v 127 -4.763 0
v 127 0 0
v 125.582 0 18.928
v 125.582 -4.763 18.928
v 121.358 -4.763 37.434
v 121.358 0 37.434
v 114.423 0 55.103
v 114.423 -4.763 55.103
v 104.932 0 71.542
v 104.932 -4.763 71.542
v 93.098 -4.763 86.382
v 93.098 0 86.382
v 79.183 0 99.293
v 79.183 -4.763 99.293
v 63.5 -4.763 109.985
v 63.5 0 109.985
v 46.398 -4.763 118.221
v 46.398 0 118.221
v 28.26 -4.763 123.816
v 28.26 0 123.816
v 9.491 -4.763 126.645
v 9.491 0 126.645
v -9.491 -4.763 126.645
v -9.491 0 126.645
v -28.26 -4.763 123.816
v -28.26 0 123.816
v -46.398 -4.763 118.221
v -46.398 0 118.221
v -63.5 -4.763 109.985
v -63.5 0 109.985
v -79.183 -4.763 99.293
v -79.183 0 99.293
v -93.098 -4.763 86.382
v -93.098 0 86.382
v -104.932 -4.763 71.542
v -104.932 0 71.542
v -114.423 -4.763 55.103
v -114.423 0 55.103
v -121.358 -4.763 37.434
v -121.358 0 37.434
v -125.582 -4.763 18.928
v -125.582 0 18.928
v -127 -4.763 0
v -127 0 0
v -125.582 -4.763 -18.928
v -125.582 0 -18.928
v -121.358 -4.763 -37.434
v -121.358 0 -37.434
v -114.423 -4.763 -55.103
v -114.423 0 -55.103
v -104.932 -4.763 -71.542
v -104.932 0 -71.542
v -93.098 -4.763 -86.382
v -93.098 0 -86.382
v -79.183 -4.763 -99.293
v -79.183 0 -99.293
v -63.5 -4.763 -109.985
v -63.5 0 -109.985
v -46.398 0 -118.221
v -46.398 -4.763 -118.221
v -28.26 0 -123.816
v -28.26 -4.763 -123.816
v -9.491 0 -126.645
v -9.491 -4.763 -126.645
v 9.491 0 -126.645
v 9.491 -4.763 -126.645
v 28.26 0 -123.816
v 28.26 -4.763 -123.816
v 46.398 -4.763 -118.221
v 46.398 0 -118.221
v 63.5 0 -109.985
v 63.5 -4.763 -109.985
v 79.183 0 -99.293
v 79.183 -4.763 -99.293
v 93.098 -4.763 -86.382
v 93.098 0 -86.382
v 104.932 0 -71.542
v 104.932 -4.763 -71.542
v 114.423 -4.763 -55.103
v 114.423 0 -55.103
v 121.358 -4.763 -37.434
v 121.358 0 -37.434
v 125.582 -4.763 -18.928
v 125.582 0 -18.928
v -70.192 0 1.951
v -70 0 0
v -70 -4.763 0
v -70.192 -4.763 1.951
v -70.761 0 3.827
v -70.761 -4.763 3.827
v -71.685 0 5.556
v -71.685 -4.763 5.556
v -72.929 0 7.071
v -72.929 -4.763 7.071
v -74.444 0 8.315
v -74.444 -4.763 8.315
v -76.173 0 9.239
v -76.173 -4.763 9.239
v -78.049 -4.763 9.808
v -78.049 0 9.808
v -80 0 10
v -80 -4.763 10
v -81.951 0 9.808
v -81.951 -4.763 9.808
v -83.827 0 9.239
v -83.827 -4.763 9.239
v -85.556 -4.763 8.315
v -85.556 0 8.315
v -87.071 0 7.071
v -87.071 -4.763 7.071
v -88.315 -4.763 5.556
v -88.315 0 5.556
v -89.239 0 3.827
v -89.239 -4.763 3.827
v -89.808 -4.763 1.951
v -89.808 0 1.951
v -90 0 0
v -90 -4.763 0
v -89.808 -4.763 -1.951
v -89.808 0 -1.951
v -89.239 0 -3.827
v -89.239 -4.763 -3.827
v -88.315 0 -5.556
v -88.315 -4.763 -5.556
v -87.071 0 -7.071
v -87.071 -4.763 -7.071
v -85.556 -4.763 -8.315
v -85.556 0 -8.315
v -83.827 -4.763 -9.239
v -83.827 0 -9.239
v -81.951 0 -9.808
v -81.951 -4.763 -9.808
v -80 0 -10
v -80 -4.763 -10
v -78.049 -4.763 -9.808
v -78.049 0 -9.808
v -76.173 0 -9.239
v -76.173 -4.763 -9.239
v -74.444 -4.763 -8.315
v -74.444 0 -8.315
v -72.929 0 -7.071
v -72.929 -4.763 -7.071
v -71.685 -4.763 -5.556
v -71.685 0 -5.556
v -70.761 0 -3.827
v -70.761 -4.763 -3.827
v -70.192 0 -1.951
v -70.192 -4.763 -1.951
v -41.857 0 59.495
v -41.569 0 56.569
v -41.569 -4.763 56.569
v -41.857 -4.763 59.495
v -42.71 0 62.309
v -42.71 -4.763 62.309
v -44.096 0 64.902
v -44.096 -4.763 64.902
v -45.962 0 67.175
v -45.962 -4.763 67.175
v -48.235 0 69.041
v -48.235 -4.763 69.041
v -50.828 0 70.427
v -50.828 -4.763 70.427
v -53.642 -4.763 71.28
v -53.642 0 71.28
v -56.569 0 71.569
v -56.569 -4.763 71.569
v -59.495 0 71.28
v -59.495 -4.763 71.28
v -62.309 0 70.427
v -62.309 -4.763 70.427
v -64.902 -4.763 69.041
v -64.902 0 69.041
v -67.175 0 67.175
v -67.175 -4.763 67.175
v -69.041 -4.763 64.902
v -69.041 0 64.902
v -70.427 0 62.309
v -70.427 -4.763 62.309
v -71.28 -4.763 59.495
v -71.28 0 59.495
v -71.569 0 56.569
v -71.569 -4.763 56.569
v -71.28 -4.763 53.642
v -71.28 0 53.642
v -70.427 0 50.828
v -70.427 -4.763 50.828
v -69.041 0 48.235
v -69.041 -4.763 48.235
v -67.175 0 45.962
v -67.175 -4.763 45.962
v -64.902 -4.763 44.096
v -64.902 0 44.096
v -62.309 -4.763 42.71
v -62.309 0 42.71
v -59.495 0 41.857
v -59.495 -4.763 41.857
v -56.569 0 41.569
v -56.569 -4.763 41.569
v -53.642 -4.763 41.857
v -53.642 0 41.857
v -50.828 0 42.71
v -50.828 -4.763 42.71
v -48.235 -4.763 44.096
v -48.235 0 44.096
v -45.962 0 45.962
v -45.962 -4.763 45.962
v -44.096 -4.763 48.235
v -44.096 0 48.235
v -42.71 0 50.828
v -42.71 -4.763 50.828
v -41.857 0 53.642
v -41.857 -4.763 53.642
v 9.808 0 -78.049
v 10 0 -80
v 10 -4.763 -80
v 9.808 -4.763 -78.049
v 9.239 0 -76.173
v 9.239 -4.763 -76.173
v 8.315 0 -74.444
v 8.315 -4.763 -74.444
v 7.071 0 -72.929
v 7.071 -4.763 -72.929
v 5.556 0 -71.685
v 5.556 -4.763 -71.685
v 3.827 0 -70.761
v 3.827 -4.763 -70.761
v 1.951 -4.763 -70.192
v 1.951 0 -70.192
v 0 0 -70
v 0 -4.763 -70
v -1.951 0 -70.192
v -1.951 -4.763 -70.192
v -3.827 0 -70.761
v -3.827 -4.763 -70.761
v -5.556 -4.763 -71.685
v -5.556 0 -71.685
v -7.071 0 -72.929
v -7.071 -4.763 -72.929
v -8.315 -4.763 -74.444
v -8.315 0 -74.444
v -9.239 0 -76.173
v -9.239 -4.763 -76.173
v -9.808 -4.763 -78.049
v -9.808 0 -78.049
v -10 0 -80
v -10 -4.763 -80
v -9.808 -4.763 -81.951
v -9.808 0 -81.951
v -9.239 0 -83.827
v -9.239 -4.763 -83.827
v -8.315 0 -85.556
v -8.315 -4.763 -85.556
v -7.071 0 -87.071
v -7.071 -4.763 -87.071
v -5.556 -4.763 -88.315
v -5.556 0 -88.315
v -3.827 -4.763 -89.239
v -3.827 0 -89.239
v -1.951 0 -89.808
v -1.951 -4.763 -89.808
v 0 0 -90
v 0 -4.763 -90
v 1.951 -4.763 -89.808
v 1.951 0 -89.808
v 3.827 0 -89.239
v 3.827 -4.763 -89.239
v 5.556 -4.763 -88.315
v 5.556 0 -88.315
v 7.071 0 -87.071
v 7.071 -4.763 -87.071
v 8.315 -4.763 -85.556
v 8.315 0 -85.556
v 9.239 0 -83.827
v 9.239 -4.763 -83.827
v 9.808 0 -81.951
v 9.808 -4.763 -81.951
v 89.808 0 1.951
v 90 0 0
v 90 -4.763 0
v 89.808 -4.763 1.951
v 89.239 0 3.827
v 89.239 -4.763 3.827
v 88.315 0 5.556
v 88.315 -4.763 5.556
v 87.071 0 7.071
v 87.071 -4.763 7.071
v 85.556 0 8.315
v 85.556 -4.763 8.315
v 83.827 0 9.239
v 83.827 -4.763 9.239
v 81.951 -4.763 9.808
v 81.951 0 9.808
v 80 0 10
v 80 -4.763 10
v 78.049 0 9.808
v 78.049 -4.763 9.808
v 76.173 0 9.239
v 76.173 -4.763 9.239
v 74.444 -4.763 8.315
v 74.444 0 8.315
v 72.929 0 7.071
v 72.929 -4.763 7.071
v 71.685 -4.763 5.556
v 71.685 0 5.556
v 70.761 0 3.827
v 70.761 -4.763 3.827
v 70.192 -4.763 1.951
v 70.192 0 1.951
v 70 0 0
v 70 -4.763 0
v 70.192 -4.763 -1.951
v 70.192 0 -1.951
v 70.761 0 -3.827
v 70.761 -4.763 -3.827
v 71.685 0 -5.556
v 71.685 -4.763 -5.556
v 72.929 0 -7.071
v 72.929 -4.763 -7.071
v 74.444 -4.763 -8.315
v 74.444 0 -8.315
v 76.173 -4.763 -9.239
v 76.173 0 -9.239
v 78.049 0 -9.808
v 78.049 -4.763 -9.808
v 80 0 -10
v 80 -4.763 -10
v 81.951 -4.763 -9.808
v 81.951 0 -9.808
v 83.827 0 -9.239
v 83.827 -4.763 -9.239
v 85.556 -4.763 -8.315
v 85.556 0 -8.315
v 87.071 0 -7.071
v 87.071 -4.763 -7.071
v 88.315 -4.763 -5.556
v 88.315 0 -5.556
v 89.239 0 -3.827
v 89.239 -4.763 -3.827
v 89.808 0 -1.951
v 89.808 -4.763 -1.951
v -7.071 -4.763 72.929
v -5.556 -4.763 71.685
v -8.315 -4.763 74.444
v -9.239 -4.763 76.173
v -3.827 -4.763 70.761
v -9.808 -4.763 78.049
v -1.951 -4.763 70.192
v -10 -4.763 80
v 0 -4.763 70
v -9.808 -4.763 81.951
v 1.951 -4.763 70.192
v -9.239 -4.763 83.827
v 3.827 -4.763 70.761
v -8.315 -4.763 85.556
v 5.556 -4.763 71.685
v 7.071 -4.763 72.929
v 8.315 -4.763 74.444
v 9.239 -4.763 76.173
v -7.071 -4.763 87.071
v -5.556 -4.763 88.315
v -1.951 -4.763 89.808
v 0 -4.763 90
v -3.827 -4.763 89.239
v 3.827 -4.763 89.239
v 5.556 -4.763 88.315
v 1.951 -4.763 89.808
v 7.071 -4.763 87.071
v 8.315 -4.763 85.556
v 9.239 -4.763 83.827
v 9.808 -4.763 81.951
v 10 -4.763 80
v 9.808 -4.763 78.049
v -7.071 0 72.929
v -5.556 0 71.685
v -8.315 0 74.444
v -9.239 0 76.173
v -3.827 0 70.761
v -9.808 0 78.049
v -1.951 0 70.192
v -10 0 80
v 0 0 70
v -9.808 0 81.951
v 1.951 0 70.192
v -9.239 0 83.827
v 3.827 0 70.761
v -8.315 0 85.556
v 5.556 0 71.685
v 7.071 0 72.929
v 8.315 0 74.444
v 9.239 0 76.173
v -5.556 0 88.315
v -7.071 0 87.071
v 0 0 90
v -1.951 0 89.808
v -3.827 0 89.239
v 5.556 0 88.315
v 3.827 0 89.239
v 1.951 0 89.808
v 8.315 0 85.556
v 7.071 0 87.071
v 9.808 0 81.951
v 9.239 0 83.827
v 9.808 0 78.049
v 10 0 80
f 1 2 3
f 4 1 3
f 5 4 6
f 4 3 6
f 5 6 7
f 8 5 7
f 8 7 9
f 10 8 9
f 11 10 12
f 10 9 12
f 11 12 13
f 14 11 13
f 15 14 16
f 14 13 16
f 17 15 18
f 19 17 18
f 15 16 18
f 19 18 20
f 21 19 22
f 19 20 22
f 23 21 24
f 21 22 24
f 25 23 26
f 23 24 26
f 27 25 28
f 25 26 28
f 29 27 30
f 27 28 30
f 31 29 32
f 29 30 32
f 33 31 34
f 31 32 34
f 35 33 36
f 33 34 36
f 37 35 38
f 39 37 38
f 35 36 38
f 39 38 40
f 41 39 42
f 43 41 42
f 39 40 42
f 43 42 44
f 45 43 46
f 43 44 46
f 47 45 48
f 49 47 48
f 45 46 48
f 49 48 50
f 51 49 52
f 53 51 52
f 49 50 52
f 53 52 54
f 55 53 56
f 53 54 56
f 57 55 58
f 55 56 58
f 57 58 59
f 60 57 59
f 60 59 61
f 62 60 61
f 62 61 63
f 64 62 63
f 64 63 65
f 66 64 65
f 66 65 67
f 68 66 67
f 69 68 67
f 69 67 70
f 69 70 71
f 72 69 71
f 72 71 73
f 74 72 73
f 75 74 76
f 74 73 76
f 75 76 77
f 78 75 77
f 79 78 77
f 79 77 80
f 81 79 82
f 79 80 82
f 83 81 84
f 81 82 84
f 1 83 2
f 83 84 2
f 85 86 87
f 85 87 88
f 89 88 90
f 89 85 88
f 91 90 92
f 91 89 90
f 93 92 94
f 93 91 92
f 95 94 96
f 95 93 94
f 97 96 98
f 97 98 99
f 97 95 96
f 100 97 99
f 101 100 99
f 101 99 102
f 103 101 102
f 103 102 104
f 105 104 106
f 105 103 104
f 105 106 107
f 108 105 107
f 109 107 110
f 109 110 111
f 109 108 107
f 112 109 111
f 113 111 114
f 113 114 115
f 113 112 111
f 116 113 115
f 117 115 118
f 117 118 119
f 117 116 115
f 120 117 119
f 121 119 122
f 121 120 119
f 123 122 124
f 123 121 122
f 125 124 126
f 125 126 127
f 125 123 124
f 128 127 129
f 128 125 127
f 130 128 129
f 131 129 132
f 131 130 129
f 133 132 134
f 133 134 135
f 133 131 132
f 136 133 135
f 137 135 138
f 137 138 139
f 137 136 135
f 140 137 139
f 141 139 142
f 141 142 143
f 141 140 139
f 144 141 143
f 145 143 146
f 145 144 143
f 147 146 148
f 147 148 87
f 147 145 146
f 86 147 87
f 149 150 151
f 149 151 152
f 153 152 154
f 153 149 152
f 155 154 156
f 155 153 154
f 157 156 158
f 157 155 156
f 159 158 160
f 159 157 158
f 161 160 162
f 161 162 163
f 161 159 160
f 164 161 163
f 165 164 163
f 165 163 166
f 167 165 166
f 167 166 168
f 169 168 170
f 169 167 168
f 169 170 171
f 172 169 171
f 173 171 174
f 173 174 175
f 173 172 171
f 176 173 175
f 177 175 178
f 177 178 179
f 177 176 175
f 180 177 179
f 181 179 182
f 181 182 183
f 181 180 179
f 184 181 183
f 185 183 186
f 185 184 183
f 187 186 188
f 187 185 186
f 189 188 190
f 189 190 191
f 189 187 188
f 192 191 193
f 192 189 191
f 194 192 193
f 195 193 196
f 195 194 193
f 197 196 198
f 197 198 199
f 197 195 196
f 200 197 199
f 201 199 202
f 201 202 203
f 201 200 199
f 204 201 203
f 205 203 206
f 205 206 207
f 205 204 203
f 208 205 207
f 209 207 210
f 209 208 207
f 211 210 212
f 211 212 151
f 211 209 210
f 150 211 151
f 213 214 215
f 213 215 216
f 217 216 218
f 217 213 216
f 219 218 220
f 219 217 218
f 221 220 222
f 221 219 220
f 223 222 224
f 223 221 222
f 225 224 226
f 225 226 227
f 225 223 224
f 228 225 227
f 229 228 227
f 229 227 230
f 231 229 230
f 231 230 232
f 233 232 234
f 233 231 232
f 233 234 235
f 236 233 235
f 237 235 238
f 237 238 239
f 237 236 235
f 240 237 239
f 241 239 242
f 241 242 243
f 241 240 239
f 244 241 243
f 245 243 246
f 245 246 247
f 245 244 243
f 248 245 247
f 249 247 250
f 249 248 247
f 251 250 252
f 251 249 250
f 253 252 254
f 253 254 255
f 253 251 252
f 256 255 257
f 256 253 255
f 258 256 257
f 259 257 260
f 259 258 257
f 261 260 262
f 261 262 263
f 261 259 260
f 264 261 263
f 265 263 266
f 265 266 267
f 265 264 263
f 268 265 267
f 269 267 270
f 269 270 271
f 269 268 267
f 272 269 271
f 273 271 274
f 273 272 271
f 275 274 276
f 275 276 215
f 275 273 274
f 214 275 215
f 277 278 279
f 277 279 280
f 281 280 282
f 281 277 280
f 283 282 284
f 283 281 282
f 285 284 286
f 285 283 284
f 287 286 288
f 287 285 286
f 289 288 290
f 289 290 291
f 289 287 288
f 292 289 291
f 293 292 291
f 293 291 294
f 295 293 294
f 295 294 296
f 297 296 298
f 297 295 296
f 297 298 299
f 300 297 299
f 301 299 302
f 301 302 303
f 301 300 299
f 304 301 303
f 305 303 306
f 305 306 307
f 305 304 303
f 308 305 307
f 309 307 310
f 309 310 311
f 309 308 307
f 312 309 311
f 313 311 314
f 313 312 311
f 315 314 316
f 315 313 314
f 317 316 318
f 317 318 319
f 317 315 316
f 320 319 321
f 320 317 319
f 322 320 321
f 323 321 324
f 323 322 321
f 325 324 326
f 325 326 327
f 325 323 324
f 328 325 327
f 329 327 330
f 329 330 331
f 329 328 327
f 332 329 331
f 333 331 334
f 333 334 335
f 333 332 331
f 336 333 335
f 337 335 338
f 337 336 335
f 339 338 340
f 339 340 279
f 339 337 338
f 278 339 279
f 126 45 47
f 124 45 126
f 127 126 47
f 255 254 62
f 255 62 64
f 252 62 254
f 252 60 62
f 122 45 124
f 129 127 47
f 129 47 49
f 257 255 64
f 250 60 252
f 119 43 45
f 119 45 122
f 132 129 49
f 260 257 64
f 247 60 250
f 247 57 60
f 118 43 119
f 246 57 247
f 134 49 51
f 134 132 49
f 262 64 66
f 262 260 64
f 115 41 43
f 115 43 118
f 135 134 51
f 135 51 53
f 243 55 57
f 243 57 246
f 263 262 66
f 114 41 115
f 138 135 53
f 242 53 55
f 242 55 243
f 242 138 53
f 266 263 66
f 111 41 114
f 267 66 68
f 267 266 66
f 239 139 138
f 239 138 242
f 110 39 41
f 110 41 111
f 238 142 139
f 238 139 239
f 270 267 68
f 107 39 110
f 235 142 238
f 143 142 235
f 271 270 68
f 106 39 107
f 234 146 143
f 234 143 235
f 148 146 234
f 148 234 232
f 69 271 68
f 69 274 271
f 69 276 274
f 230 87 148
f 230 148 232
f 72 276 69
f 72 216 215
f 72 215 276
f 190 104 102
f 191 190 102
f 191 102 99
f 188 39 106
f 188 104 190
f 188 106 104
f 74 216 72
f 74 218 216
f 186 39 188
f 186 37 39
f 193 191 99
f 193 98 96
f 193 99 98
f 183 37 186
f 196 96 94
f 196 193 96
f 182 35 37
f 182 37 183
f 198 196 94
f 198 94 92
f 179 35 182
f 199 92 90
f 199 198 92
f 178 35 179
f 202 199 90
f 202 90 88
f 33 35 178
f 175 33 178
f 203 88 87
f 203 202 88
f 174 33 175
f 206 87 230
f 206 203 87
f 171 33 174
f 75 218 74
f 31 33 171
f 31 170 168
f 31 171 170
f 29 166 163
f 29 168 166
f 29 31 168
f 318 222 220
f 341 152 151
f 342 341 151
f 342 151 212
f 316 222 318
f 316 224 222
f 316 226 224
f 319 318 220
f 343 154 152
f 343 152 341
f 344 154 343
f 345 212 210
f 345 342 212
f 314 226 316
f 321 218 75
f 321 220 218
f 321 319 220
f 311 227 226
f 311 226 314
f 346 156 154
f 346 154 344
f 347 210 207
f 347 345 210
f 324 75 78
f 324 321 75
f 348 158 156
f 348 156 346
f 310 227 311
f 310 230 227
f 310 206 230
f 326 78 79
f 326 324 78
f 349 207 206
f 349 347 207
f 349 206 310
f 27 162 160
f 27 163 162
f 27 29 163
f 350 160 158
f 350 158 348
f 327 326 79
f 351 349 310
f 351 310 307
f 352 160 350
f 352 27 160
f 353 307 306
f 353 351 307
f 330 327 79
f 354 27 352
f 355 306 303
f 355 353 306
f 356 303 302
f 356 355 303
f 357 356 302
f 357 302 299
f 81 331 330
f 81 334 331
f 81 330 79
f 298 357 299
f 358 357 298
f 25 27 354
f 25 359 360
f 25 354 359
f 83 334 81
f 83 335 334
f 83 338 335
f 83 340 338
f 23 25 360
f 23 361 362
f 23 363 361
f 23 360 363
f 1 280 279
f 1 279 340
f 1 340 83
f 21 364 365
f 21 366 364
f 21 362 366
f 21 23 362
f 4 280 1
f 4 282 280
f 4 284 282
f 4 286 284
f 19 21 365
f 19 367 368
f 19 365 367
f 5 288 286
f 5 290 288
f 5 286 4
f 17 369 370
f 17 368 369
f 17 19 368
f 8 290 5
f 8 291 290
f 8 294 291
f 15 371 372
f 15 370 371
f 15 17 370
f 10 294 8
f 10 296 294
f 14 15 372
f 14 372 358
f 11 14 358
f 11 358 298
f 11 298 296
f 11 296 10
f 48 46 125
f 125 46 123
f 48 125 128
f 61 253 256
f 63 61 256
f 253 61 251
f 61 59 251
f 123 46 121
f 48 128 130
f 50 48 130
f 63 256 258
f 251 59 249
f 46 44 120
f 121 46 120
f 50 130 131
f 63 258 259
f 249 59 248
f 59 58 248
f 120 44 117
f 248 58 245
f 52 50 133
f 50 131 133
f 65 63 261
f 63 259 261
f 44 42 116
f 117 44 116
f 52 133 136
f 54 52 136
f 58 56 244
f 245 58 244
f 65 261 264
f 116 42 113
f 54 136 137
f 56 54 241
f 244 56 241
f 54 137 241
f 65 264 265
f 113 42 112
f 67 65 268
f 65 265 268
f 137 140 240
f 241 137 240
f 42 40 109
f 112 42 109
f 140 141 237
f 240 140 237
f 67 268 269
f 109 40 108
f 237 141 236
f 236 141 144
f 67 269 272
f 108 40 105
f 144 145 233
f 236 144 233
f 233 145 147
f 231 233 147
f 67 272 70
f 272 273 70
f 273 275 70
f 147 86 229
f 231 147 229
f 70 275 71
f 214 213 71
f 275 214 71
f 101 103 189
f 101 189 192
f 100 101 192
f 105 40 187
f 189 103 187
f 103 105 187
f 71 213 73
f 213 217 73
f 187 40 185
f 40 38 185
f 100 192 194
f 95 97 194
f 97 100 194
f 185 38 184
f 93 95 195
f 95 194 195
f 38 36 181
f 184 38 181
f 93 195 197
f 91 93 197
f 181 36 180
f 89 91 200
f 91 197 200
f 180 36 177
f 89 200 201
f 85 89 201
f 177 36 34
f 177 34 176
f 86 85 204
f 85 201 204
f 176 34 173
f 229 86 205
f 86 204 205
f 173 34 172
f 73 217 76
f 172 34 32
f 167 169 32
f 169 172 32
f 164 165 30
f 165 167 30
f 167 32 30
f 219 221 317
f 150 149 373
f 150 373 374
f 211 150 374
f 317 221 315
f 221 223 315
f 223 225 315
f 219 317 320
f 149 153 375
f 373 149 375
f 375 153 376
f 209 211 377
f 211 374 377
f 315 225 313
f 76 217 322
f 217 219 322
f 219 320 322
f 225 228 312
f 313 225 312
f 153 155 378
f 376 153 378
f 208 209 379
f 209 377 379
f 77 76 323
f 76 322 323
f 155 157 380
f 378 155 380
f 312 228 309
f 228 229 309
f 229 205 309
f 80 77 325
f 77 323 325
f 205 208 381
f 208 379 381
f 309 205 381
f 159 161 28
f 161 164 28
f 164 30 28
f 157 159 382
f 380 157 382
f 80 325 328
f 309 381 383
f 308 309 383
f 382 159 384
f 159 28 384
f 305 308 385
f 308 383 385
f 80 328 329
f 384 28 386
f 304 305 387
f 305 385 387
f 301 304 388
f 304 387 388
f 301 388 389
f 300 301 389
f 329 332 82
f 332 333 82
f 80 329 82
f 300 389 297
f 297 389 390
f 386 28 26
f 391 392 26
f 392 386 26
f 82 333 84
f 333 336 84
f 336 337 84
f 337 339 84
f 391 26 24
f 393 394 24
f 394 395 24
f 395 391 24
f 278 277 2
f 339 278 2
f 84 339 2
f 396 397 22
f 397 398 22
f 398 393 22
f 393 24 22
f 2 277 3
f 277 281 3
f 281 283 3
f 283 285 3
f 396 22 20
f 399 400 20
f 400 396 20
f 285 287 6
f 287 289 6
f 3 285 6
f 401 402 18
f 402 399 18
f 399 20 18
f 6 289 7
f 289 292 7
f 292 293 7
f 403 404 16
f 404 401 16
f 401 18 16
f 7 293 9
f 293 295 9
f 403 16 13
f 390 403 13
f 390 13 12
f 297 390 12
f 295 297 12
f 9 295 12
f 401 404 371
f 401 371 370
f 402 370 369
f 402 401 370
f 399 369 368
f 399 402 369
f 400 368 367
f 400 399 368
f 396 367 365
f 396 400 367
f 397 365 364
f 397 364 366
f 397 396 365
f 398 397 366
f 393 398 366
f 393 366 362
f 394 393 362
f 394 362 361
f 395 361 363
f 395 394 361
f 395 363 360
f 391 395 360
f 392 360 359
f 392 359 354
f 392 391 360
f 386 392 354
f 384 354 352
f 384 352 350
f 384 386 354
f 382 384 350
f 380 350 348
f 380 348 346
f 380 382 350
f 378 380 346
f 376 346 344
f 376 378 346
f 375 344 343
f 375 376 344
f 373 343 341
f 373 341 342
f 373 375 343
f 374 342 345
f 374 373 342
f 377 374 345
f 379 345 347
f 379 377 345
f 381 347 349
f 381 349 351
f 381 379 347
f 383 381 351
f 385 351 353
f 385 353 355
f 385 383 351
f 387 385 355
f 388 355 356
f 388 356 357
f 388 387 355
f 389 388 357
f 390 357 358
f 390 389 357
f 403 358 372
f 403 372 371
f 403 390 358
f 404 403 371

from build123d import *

# Parameters (mm, degrees)
F0_R     = 127
F0_R_2   = 10
F0_R_3   = 15
F1_DEPTH = 4.763


with BuildPart() as f1:
    # F0 (on Front) → F1 (new body)
    with BuildSketch(Plane.XZ):
        Circle(F0_R)
        with Locations((0, -80)):
            Circle(F0_R_2, mode=Mode.SUBTRACT)
        with Locations((-80, 0)):
            Circle(F0_R_2, mode=Mode.SUBTRACT)
        with Locations((-56.568542, 56.568542)):
            Circle(F0_R_3, mode=Mode.SUBTRACT)
        with Locations((80, 0)):
            Circle(F0_R_2, mode=Mode.SUBTRACT)
        with Locations((0, 80)):
            Circle(F0_R_2, mode=Mode.SUBTRACT)
    extrude(amount=F1_DEPTH)


solid = f1.part
